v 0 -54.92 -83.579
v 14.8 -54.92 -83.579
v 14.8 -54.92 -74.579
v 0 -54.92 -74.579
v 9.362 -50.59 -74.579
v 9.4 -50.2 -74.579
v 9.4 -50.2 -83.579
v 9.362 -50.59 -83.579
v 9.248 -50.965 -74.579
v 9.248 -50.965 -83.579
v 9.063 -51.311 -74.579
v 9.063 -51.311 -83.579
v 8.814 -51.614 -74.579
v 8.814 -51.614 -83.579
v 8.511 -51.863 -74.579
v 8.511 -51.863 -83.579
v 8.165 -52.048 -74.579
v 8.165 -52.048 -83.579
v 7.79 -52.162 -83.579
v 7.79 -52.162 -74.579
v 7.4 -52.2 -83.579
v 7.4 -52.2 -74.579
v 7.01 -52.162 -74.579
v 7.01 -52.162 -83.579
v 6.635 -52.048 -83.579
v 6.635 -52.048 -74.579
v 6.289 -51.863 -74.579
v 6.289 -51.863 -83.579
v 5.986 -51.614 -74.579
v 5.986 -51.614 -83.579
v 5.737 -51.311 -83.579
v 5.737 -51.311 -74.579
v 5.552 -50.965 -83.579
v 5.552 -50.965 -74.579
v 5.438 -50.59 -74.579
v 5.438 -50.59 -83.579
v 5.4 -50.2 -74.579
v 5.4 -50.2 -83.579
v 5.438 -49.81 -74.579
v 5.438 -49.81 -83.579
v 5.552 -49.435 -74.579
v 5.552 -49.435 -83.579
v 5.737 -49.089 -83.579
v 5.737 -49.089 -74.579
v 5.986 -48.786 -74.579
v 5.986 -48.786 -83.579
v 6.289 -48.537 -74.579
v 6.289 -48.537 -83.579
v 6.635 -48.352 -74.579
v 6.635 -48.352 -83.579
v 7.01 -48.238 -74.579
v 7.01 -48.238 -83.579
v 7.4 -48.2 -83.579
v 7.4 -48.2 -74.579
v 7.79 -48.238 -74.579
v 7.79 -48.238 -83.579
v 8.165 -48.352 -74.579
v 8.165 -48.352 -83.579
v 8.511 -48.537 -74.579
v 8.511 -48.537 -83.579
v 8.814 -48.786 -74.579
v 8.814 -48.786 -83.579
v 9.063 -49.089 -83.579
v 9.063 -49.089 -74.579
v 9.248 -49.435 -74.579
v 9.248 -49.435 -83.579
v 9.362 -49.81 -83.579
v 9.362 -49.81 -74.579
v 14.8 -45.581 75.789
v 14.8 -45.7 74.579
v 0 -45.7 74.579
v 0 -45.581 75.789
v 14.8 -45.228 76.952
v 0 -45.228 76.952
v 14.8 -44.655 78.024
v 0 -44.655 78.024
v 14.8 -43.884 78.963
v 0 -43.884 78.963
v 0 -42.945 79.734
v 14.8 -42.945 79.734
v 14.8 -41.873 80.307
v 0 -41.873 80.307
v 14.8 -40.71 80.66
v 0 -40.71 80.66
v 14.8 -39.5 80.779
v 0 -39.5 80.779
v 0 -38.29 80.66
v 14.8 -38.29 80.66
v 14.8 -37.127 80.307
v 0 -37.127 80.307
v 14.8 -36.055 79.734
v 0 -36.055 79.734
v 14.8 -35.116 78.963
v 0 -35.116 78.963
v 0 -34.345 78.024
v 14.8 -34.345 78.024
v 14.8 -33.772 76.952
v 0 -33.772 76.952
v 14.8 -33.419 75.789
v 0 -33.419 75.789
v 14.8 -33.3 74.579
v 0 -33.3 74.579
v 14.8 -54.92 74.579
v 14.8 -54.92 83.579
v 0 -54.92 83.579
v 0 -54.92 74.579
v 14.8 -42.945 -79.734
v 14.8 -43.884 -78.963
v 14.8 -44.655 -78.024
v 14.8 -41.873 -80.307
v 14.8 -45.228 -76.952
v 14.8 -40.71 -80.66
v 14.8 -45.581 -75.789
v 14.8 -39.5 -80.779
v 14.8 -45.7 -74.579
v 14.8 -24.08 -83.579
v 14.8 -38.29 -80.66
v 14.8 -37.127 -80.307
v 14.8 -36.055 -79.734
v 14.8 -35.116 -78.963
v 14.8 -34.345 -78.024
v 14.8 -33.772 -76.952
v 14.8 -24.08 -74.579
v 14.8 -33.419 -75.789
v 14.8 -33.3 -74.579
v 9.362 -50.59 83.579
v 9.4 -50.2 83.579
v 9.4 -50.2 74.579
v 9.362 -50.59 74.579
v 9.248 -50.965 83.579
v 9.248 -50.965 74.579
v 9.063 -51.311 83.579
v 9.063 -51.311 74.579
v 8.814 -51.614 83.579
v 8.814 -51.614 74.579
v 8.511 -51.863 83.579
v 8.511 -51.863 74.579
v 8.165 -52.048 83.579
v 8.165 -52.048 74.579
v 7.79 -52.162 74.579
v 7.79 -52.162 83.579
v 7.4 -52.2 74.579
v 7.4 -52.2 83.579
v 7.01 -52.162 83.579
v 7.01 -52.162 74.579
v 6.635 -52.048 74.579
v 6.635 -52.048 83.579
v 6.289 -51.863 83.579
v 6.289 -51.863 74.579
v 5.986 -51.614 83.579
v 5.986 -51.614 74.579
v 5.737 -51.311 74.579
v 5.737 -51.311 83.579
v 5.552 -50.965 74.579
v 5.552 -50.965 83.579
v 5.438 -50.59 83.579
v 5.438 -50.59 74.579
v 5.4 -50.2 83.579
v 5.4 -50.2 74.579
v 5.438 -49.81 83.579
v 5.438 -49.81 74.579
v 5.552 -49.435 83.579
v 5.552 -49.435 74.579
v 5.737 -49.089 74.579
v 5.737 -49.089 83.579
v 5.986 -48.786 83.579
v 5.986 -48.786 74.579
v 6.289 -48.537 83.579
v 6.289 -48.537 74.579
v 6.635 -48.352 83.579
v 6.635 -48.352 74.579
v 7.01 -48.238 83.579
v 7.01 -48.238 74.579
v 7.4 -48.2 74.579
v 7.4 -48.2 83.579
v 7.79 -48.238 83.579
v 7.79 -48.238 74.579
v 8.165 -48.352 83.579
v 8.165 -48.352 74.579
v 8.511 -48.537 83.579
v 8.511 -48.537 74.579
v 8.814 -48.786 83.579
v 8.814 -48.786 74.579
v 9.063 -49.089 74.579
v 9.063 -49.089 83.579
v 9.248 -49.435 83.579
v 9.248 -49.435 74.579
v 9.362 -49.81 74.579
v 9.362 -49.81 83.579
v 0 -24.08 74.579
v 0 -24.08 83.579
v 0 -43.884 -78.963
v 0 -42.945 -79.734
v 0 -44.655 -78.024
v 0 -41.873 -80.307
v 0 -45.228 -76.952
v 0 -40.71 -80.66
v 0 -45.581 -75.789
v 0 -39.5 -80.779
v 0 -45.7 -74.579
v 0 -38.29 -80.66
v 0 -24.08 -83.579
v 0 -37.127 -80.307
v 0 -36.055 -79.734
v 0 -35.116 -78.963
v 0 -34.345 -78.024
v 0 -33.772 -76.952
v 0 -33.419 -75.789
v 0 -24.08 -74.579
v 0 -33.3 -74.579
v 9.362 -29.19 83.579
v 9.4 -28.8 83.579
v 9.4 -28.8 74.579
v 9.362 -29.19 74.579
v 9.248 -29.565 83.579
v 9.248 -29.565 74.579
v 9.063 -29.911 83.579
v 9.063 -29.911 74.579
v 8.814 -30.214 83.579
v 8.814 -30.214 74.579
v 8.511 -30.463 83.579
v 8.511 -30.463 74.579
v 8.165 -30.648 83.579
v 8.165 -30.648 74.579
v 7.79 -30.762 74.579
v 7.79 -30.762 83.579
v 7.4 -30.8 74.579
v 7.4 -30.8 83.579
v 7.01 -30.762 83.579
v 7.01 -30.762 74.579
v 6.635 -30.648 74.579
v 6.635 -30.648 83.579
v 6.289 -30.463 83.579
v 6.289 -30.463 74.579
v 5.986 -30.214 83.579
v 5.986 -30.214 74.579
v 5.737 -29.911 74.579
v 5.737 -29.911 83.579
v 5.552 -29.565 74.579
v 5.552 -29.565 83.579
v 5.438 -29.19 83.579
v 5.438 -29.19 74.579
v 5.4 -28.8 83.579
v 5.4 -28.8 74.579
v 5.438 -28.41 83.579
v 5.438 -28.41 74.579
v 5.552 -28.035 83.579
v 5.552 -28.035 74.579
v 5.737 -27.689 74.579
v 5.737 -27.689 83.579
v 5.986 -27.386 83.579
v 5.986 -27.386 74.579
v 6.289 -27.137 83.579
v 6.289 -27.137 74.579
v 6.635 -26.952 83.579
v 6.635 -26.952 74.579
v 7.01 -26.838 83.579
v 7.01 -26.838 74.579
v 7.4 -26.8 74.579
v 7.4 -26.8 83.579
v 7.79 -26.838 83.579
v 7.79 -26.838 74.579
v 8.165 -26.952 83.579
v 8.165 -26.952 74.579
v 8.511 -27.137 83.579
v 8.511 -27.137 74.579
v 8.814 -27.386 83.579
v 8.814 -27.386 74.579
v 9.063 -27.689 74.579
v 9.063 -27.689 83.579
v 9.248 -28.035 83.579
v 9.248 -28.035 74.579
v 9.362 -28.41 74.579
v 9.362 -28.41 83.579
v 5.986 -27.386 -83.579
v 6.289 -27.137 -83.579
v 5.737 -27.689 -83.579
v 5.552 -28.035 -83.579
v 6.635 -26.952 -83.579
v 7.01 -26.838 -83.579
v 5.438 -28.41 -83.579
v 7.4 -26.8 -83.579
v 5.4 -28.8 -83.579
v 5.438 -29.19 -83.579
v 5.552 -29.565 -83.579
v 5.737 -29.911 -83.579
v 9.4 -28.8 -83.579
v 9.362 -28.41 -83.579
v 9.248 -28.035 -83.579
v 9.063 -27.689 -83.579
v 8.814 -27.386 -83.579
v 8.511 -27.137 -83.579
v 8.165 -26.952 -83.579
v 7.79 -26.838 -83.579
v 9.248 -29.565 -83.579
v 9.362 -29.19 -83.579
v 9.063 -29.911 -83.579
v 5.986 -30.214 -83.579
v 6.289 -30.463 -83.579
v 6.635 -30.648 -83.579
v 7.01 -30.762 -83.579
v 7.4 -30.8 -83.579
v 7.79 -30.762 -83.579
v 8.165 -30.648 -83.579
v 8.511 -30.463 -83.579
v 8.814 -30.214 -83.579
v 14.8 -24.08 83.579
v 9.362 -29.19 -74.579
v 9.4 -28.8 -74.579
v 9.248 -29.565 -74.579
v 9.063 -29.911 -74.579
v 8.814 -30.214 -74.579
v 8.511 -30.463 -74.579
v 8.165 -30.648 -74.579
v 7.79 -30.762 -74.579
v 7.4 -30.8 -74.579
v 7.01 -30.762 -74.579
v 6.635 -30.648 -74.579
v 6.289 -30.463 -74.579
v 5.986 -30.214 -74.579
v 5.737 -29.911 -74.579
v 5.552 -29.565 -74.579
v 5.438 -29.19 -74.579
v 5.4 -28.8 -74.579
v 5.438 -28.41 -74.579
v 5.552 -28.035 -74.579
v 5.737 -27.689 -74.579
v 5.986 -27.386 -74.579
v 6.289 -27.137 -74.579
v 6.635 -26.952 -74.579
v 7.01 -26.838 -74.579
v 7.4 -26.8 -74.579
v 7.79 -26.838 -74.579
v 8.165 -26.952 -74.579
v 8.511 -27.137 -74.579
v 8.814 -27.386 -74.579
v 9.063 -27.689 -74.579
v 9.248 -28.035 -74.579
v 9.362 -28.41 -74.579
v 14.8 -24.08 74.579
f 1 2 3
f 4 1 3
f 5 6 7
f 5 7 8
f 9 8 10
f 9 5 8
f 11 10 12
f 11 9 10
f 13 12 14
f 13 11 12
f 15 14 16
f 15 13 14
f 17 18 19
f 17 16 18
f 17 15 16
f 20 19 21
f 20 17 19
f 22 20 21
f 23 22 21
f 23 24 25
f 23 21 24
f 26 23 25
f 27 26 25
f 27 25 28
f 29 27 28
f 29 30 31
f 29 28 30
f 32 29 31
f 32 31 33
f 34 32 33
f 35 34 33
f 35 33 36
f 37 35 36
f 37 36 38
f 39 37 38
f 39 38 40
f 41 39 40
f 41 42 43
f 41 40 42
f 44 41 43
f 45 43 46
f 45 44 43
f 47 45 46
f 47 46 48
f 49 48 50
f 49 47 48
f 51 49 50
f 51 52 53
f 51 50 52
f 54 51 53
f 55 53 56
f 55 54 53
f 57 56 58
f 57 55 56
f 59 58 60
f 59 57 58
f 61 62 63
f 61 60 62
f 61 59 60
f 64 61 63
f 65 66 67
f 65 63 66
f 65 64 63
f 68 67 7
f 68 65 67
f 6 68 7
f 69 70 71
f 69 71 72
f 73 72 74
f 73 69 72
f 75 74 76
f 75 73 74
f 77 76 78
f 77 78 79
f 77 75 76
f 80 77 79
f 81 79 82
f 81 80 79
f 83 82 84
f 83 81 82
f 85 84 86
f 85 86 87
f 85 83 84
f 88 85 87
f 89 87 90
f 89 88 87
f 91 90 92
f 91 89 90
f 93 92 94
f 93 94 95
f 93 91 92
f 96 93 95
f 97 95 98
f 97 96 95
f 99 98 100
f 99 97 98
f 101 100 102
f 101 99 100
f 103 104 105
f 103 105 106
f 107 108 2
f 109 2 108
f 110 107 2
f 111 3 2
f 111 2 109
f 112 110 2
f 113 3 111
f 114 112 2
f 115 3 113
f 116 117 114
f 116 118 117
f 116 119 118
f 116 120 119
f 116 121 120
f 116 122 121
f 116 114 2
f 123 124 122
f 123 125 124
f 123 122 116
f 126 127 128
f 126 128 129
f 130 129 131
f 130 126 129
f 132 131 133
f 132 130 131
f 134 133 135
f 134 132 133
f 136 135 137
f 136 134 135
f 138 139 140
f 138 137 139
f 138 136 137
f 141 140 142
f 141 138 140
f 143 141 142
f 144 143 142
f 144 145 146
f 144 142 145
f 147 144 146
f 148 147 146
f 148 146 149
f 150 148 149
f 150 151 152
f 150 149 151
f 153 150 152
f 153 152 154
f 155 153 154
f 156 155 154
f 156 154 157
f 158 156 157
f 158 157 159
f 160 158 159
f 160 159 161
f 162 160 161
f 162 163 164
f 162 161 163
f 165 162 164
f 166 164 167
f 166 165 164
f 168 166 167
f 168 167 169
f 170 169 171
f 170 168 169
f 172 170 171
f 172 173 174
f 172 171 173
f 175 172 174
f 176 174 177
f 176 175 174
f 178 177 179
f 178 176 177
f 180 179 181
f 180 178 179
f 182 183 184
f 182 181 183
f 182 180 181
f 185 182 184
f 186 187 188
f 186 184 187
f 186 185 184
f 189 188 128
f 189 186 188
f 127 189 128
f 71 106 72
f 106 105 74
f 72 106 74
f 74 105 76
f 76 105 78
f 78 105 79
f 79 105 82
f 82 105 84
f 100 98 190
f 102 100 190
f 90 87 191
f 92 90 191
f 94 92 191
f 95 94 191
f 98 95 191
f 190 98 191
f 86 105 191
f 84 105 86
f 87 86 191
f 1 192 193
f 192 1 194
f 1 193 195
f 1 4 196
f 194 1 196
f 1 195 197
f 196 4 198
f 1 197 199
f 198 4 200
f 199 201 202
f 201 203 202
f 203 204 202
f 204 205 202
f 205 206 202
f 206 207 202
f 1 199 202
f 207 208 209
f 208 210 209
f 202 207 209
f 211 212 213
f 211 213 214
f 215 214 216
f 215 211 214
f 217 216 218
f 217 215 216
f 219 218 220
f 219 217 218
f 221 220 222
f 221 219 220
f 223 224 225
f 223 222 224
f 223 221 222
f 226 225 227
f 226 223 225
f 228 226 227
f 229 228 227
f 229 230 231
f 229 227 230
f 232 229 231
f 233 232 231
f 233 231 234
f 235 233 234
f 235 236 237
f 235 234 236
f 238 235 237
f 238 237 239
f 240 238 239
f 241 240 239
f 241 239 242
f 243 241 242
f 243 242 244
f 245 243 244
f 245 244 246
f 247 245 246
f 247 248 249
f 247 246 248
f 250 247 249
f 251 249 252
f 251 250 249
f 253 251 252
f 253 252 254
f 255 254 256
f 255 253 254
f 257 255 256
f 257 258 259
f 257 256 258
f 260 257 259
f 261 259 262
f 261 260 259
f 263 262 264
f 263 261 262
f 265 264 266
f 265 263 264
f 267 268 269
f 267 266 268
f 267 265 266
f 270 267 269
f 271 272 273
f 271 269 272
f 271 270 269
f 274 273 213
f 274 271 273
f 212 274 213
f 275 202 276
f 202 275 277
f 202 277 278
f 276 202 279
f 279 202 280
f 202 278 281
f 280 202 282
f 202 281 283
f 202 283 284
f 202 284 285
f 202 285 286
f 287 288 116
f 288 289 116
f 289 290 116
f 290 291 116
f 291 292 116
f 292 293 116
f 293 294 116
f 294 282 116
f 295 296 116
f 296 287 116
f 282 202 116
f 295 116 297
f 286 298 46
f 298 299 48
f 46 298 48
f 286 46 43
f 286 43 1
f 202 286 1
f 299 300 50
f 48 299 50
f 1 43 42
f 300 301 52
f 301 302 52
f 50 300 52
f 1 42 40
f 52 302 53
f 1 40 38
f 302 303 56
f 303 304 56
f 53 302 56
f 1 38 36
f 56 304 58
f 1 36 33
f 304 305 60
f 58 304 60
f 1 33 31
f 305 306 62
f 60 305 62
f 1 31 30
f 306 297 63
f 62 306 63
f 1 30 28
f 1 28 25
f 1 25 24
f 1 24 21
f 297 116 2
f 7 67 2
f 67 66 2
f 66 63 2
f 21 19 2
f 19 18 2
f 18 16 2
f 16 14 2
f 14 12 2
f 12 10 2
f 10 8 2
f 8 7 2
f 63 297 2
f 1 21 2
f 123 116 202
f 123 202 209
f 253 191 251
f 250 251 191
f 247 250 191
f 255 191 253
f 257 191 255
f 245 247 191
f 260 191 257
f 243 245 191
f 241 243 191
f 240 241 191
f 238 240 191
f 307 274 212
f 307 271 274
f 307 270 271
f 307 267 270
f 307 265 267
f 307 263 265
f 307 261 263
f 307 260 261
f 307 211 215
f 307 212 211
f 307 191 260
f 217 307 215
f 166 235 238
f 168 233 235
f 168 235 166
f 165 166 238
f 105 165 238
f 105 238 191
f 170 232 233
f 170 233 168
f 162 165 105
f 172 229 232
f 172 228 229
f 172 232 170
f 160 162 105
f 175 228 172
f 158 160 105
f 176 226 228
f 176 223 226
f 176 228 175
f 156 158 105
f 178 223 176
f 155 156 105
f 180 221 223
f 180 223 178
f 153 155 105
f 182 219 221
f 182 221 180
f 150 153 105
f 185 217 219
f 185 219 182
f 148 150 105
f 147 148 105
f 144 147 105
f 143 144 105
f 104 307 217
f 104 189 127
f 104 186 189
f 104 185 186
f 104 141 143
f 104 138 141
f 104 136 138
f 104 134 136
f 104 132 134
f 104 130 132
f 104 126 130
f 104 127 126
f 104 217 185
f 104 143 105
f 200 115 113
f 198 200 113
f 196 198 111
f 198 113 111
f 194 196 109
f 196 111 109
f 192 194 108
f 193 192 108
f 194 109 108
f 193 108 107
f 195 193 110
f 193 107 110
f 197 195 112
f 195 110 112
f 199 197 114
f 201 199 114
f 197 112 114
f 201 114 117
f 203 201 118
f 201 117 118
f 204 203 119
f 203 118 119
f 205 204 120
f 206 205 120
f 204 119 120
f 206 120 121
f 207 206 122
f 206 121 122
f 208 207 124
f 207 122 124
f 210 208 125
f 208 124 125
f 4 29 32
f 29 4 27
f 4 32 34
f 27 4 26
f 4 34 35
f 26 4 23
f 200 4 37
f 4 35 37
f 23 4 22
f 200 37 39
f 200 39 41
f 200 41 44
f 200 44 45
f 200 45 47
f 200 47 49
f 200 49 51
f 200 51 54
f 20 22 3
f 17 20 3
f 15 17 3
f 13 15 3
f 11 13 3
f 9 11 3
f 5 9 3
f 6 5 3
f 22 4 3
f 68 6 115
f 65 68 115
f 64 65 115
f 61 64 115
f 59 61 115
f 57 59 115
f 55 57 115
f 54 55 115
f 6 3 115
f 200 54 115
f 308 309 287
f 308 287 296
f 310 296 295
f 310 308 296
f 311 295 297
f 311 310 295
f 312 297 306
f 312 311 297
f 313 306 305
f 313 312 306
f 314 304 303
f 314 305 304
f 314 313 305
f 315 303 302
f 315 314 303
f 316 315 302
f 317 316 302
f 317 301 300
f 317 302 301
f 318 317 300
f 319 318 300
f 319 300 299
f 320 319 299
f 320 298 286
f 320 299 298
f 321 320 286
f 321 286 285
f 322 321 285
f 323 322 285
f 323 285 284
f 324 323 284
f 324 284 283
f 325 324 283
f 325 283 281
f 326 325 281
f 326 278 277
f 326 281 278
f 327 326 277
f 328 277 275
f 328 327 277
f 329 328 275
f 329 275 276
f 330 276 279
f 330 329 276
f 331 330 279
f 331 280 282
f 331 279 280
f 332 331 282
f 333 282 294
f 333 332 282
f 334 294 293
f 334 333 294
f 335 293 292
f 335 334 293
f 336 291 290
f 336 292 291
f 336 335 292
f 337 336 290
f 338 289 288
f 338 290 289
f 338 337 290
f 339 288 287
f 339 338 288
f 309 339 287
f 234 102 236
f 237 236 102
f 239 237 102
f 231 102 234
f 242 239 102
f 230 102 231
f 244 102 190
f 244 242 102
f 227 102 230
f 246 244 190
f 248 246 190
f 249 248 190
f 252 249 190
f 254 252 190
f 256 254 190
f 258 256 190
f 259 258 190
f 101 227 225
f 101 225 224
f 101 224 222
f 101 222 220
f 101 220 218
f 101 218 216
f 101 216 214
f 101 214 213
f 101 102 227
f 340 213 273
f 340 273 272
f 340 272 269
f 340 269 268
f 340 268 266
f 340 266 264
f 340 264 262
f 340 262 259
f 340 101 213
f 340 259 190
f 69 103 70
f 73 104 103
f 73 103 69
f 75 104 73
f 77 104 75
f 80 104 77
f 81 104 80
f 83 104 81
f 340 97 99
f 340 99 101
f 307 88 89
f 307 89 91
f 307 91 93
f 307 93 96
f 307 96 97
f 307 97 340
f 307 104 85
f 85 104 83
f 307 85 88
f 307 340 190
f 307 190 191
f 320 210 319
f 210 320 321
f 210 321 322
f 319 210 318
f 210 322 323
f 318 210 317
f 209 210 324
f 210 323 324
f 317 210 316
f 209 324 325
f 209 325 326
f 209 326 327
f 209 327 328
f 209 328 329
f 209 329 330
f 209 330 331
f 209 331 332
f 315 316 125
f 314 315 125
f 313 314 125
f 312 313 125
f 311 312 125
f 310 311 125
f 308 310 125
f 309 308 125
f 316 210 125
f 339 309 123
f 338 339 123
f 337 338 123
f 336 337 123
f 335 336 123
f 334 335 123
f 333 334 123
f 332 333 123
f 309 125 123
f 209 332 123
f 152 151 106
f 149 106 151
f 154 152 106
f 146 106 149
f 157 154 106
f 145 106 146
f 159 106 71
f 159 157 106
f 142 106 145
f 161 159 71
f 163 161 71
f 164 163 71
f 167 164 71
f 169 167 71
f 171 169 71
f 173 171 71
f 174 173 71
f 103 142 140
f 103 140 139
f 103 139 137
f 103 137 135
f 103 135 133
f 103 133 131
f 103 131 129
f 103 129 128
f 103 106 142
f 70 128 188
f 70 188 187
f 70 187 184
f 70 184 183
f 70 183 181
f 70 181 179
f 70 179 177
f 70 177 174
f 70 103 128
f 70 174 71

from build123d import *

# Parameters (mm, degrees)
SKETCH2_W               = 180
SKETCH2_H               = 9
BOSS_EXTRUDE1_DEPTH     = 14.8
SKETCH7_W               = 90
SKETCH7_H               = 4.5
CUT_EXTRUDE1_DEPTH      = 92.319713096
FILLET1_R               = 8
BOSS_EXTRUDE2_DEPTH     = 14.8
CUT_EXTRUDE2_DEPTH      = 175.130679781
CUT_EXTRUDE2_DEPTH_BACK = 175.130679781
SKETCH11_R              = 2
CUT_EXTRUDE3_DEPTH      = 107.467114171
CUT_EXTRUDE3_DEPTH_BACK = 107.467114171


with BuildPart() as part:
    # Sketch2 → Boss-Extrude1 (new body)
    with BuildSketch(Plane(origin=(0, 0, 0), x_dir=(0, 0, -1), z_dir=(1, 0, 0))):
        Rectangle(SKETCH2_W, SKETCH2_H)
    extrude(amount=BOSS_EXTRUDE1_DEPTH)

    # Sketch7 → Cut-Extrude1 (cut, through all)
    with BuildSketch(Plane(origin=(14.8, 0, 0), x_dir=(0, 0, -1), z_dir=(1, 0, 0))):
        with Locations((0, -2.25)):
            Rectangle(SKETCH7_W, SKETCH7_H)
    extrude(amount=-CUT_EXTRUDE1_DEPTH, mode=Mode.SUBTRACT)

    # Fillet1
    # the kernel refuses this fillet: 8 mm, written as the material it adds along each edge
    with BuildSketch(Plane(origin=(14.8, 0, -45), x_dir=(0, -1, 0), z_dir=(-1, 0, 0))) as fillet1_piece_1:
        with BuildLine():
            CenterArc((8, 7.193747285), FILLET1_R, 180, 64.055520228)
            Line((0, 7.193747285), (-0.16, 7.193747285))
            Line((-0.16, 7.193747285), (-0.16, 0))
            Line((-0.16, 0), (0, -0.16))
            ThreePointArc((0, -0.16), (2.25, -0.16), (4.43, -0.143874946))
            Line((4.43, -0.143874946), (4.5, 0))
        make_face()
    extrude(amount=14.8)
    with BuildSketch(Plane(origin=(14.8, 0, 45), x_dir=(0, -1, 0), z_dir=(-1, 0, 0))) as fillet1_piece_2:
        with BuildLine():
            CenterArc((8, -7.193747285), FILLET1_R, 115.944479772, 64.055520228)
            Line((0, -7.193747285), (-0.16, -7.193747285))
            Line((-0.16, -7.193747285), (-0.16, 0))
            Line((-0.16, 0), (0, 0.16))
            ThreePointArc((0, 0.16), (2.25, 0.16), (4.43, 0.143874946))
            Line((4.43, 0.143874946), (4.5, 0))
        make_face()
    extrude(amount=14.8)

    # Sketch8 → Boss-Extrude2 (add)
    with BuildSketch(Plane(origin=(14.8, 0, 0), x_dir=(0, 0, -1), z_dir=(1, 0, 0))):
        with BuildLine():
            Line((83.579, -39.5), (83.579, -54.92))
            Line((83.579, -54.92), (74.579, -54.92))
            Line((74.579, -54.92), (74.579, -45.7))
            ThreePointArc((74.579, -45.7), (80.779, -39.5), (74.579, -33.3))
            Line((74.579, -33.3), (74.579, -4.5))
            Line((74.579, -4.5), (83.579, -4.5))
            Line((83.579, -4.5), (83.579, -39.5))
        make_face()
        with BuildLine():
            Line((-74.579, -54.92), (-74.579, -45.7))
            ThreePointArc((-74.579, -45.7), (-80.779, -39.5), (-74.579, -33.3))
            Line((-74.579, -33.3), (-74.579, -4.5))
            Line((-74.579, -4.5), (-83.579, -4.5))
            Line((-83.579, -4.5), (-83.579, -39.5))
            Line((-83.579, -39.5), (-83.579, -54.92))
            Line((-83.579, -54.92), (-74.579, -54.92))
        make_face()
    extrude(amount=-BOSS_EXTRUDE2_DEPTH)

    # Sketch11 → Cut-Extrude2 (cut, two sides: drawn at the far end of the back side and taken through both)
    with BuildSketch(Plane(origin=(0, 0, 74.579), x_dir=(-1, 0, 0), z_dir=(0, 0, -1)).offset(-CUT_EXTRUDE2_DEPTH_BACK)):
        with Locations(Location((-7.4, -28.8, 0), (0, 0, 180))):
            Circle(SKETCH11_R)
        with Locations(Location((-7.4, -50.2, 0), (0, 0, 180))):
            Circle(SKETCH11_R)
    extrude(amount=CUT_EXTRUDE2_DEPTH + CUT_EXTRUDE2_DEPTH_BACK, mode=Mode.SUBTRACT)

    # Sketch12 → Cut-Extrude3 (cut, two sides: drawn at the far end of the back side and taken through both)
    with BuildSketch(Plane.ZY.offset(-CUT_EXTRUDE3_DEPTH_BACK)):
        Polygon((96.986162818, 8.741450318), (-95.153164269, 8.741450318), (-95.153164269, -16.038890922), (-95.153164269, -24.08), (74.579, -24.08), (96.986162818, -24.08), (96.986162818, -16.038890922), (96.986162818, -4.5), align=None)
    extrude(amount=CUT_EXTRUDE3_DEPTH + CUT_EXTRUDE3_DEPTH_BACK, mode=Mode.SUBTRACT)


with BuildPart() as cut_extrude3_piece_1:
    # of the separate pieces the step leaves, piece 1, a body of its own (cut_extrude3_pieces)
    add(part.part.solids().sort_by_distance((14.8, -24.08, -83.579))[0])


with BuildPart() as cut_extrude3_piece_2:
    # of the separate pieces the step leaves, piece 2, a body of its own (cut_extrude3_pieces)
    add(part.part.solids().sort_by_distance((14.8, -33.3, 74.579))[0])


solid = Compound([cut_extrude3_piece_1.part, cut_extrude3_piece_2.part])
